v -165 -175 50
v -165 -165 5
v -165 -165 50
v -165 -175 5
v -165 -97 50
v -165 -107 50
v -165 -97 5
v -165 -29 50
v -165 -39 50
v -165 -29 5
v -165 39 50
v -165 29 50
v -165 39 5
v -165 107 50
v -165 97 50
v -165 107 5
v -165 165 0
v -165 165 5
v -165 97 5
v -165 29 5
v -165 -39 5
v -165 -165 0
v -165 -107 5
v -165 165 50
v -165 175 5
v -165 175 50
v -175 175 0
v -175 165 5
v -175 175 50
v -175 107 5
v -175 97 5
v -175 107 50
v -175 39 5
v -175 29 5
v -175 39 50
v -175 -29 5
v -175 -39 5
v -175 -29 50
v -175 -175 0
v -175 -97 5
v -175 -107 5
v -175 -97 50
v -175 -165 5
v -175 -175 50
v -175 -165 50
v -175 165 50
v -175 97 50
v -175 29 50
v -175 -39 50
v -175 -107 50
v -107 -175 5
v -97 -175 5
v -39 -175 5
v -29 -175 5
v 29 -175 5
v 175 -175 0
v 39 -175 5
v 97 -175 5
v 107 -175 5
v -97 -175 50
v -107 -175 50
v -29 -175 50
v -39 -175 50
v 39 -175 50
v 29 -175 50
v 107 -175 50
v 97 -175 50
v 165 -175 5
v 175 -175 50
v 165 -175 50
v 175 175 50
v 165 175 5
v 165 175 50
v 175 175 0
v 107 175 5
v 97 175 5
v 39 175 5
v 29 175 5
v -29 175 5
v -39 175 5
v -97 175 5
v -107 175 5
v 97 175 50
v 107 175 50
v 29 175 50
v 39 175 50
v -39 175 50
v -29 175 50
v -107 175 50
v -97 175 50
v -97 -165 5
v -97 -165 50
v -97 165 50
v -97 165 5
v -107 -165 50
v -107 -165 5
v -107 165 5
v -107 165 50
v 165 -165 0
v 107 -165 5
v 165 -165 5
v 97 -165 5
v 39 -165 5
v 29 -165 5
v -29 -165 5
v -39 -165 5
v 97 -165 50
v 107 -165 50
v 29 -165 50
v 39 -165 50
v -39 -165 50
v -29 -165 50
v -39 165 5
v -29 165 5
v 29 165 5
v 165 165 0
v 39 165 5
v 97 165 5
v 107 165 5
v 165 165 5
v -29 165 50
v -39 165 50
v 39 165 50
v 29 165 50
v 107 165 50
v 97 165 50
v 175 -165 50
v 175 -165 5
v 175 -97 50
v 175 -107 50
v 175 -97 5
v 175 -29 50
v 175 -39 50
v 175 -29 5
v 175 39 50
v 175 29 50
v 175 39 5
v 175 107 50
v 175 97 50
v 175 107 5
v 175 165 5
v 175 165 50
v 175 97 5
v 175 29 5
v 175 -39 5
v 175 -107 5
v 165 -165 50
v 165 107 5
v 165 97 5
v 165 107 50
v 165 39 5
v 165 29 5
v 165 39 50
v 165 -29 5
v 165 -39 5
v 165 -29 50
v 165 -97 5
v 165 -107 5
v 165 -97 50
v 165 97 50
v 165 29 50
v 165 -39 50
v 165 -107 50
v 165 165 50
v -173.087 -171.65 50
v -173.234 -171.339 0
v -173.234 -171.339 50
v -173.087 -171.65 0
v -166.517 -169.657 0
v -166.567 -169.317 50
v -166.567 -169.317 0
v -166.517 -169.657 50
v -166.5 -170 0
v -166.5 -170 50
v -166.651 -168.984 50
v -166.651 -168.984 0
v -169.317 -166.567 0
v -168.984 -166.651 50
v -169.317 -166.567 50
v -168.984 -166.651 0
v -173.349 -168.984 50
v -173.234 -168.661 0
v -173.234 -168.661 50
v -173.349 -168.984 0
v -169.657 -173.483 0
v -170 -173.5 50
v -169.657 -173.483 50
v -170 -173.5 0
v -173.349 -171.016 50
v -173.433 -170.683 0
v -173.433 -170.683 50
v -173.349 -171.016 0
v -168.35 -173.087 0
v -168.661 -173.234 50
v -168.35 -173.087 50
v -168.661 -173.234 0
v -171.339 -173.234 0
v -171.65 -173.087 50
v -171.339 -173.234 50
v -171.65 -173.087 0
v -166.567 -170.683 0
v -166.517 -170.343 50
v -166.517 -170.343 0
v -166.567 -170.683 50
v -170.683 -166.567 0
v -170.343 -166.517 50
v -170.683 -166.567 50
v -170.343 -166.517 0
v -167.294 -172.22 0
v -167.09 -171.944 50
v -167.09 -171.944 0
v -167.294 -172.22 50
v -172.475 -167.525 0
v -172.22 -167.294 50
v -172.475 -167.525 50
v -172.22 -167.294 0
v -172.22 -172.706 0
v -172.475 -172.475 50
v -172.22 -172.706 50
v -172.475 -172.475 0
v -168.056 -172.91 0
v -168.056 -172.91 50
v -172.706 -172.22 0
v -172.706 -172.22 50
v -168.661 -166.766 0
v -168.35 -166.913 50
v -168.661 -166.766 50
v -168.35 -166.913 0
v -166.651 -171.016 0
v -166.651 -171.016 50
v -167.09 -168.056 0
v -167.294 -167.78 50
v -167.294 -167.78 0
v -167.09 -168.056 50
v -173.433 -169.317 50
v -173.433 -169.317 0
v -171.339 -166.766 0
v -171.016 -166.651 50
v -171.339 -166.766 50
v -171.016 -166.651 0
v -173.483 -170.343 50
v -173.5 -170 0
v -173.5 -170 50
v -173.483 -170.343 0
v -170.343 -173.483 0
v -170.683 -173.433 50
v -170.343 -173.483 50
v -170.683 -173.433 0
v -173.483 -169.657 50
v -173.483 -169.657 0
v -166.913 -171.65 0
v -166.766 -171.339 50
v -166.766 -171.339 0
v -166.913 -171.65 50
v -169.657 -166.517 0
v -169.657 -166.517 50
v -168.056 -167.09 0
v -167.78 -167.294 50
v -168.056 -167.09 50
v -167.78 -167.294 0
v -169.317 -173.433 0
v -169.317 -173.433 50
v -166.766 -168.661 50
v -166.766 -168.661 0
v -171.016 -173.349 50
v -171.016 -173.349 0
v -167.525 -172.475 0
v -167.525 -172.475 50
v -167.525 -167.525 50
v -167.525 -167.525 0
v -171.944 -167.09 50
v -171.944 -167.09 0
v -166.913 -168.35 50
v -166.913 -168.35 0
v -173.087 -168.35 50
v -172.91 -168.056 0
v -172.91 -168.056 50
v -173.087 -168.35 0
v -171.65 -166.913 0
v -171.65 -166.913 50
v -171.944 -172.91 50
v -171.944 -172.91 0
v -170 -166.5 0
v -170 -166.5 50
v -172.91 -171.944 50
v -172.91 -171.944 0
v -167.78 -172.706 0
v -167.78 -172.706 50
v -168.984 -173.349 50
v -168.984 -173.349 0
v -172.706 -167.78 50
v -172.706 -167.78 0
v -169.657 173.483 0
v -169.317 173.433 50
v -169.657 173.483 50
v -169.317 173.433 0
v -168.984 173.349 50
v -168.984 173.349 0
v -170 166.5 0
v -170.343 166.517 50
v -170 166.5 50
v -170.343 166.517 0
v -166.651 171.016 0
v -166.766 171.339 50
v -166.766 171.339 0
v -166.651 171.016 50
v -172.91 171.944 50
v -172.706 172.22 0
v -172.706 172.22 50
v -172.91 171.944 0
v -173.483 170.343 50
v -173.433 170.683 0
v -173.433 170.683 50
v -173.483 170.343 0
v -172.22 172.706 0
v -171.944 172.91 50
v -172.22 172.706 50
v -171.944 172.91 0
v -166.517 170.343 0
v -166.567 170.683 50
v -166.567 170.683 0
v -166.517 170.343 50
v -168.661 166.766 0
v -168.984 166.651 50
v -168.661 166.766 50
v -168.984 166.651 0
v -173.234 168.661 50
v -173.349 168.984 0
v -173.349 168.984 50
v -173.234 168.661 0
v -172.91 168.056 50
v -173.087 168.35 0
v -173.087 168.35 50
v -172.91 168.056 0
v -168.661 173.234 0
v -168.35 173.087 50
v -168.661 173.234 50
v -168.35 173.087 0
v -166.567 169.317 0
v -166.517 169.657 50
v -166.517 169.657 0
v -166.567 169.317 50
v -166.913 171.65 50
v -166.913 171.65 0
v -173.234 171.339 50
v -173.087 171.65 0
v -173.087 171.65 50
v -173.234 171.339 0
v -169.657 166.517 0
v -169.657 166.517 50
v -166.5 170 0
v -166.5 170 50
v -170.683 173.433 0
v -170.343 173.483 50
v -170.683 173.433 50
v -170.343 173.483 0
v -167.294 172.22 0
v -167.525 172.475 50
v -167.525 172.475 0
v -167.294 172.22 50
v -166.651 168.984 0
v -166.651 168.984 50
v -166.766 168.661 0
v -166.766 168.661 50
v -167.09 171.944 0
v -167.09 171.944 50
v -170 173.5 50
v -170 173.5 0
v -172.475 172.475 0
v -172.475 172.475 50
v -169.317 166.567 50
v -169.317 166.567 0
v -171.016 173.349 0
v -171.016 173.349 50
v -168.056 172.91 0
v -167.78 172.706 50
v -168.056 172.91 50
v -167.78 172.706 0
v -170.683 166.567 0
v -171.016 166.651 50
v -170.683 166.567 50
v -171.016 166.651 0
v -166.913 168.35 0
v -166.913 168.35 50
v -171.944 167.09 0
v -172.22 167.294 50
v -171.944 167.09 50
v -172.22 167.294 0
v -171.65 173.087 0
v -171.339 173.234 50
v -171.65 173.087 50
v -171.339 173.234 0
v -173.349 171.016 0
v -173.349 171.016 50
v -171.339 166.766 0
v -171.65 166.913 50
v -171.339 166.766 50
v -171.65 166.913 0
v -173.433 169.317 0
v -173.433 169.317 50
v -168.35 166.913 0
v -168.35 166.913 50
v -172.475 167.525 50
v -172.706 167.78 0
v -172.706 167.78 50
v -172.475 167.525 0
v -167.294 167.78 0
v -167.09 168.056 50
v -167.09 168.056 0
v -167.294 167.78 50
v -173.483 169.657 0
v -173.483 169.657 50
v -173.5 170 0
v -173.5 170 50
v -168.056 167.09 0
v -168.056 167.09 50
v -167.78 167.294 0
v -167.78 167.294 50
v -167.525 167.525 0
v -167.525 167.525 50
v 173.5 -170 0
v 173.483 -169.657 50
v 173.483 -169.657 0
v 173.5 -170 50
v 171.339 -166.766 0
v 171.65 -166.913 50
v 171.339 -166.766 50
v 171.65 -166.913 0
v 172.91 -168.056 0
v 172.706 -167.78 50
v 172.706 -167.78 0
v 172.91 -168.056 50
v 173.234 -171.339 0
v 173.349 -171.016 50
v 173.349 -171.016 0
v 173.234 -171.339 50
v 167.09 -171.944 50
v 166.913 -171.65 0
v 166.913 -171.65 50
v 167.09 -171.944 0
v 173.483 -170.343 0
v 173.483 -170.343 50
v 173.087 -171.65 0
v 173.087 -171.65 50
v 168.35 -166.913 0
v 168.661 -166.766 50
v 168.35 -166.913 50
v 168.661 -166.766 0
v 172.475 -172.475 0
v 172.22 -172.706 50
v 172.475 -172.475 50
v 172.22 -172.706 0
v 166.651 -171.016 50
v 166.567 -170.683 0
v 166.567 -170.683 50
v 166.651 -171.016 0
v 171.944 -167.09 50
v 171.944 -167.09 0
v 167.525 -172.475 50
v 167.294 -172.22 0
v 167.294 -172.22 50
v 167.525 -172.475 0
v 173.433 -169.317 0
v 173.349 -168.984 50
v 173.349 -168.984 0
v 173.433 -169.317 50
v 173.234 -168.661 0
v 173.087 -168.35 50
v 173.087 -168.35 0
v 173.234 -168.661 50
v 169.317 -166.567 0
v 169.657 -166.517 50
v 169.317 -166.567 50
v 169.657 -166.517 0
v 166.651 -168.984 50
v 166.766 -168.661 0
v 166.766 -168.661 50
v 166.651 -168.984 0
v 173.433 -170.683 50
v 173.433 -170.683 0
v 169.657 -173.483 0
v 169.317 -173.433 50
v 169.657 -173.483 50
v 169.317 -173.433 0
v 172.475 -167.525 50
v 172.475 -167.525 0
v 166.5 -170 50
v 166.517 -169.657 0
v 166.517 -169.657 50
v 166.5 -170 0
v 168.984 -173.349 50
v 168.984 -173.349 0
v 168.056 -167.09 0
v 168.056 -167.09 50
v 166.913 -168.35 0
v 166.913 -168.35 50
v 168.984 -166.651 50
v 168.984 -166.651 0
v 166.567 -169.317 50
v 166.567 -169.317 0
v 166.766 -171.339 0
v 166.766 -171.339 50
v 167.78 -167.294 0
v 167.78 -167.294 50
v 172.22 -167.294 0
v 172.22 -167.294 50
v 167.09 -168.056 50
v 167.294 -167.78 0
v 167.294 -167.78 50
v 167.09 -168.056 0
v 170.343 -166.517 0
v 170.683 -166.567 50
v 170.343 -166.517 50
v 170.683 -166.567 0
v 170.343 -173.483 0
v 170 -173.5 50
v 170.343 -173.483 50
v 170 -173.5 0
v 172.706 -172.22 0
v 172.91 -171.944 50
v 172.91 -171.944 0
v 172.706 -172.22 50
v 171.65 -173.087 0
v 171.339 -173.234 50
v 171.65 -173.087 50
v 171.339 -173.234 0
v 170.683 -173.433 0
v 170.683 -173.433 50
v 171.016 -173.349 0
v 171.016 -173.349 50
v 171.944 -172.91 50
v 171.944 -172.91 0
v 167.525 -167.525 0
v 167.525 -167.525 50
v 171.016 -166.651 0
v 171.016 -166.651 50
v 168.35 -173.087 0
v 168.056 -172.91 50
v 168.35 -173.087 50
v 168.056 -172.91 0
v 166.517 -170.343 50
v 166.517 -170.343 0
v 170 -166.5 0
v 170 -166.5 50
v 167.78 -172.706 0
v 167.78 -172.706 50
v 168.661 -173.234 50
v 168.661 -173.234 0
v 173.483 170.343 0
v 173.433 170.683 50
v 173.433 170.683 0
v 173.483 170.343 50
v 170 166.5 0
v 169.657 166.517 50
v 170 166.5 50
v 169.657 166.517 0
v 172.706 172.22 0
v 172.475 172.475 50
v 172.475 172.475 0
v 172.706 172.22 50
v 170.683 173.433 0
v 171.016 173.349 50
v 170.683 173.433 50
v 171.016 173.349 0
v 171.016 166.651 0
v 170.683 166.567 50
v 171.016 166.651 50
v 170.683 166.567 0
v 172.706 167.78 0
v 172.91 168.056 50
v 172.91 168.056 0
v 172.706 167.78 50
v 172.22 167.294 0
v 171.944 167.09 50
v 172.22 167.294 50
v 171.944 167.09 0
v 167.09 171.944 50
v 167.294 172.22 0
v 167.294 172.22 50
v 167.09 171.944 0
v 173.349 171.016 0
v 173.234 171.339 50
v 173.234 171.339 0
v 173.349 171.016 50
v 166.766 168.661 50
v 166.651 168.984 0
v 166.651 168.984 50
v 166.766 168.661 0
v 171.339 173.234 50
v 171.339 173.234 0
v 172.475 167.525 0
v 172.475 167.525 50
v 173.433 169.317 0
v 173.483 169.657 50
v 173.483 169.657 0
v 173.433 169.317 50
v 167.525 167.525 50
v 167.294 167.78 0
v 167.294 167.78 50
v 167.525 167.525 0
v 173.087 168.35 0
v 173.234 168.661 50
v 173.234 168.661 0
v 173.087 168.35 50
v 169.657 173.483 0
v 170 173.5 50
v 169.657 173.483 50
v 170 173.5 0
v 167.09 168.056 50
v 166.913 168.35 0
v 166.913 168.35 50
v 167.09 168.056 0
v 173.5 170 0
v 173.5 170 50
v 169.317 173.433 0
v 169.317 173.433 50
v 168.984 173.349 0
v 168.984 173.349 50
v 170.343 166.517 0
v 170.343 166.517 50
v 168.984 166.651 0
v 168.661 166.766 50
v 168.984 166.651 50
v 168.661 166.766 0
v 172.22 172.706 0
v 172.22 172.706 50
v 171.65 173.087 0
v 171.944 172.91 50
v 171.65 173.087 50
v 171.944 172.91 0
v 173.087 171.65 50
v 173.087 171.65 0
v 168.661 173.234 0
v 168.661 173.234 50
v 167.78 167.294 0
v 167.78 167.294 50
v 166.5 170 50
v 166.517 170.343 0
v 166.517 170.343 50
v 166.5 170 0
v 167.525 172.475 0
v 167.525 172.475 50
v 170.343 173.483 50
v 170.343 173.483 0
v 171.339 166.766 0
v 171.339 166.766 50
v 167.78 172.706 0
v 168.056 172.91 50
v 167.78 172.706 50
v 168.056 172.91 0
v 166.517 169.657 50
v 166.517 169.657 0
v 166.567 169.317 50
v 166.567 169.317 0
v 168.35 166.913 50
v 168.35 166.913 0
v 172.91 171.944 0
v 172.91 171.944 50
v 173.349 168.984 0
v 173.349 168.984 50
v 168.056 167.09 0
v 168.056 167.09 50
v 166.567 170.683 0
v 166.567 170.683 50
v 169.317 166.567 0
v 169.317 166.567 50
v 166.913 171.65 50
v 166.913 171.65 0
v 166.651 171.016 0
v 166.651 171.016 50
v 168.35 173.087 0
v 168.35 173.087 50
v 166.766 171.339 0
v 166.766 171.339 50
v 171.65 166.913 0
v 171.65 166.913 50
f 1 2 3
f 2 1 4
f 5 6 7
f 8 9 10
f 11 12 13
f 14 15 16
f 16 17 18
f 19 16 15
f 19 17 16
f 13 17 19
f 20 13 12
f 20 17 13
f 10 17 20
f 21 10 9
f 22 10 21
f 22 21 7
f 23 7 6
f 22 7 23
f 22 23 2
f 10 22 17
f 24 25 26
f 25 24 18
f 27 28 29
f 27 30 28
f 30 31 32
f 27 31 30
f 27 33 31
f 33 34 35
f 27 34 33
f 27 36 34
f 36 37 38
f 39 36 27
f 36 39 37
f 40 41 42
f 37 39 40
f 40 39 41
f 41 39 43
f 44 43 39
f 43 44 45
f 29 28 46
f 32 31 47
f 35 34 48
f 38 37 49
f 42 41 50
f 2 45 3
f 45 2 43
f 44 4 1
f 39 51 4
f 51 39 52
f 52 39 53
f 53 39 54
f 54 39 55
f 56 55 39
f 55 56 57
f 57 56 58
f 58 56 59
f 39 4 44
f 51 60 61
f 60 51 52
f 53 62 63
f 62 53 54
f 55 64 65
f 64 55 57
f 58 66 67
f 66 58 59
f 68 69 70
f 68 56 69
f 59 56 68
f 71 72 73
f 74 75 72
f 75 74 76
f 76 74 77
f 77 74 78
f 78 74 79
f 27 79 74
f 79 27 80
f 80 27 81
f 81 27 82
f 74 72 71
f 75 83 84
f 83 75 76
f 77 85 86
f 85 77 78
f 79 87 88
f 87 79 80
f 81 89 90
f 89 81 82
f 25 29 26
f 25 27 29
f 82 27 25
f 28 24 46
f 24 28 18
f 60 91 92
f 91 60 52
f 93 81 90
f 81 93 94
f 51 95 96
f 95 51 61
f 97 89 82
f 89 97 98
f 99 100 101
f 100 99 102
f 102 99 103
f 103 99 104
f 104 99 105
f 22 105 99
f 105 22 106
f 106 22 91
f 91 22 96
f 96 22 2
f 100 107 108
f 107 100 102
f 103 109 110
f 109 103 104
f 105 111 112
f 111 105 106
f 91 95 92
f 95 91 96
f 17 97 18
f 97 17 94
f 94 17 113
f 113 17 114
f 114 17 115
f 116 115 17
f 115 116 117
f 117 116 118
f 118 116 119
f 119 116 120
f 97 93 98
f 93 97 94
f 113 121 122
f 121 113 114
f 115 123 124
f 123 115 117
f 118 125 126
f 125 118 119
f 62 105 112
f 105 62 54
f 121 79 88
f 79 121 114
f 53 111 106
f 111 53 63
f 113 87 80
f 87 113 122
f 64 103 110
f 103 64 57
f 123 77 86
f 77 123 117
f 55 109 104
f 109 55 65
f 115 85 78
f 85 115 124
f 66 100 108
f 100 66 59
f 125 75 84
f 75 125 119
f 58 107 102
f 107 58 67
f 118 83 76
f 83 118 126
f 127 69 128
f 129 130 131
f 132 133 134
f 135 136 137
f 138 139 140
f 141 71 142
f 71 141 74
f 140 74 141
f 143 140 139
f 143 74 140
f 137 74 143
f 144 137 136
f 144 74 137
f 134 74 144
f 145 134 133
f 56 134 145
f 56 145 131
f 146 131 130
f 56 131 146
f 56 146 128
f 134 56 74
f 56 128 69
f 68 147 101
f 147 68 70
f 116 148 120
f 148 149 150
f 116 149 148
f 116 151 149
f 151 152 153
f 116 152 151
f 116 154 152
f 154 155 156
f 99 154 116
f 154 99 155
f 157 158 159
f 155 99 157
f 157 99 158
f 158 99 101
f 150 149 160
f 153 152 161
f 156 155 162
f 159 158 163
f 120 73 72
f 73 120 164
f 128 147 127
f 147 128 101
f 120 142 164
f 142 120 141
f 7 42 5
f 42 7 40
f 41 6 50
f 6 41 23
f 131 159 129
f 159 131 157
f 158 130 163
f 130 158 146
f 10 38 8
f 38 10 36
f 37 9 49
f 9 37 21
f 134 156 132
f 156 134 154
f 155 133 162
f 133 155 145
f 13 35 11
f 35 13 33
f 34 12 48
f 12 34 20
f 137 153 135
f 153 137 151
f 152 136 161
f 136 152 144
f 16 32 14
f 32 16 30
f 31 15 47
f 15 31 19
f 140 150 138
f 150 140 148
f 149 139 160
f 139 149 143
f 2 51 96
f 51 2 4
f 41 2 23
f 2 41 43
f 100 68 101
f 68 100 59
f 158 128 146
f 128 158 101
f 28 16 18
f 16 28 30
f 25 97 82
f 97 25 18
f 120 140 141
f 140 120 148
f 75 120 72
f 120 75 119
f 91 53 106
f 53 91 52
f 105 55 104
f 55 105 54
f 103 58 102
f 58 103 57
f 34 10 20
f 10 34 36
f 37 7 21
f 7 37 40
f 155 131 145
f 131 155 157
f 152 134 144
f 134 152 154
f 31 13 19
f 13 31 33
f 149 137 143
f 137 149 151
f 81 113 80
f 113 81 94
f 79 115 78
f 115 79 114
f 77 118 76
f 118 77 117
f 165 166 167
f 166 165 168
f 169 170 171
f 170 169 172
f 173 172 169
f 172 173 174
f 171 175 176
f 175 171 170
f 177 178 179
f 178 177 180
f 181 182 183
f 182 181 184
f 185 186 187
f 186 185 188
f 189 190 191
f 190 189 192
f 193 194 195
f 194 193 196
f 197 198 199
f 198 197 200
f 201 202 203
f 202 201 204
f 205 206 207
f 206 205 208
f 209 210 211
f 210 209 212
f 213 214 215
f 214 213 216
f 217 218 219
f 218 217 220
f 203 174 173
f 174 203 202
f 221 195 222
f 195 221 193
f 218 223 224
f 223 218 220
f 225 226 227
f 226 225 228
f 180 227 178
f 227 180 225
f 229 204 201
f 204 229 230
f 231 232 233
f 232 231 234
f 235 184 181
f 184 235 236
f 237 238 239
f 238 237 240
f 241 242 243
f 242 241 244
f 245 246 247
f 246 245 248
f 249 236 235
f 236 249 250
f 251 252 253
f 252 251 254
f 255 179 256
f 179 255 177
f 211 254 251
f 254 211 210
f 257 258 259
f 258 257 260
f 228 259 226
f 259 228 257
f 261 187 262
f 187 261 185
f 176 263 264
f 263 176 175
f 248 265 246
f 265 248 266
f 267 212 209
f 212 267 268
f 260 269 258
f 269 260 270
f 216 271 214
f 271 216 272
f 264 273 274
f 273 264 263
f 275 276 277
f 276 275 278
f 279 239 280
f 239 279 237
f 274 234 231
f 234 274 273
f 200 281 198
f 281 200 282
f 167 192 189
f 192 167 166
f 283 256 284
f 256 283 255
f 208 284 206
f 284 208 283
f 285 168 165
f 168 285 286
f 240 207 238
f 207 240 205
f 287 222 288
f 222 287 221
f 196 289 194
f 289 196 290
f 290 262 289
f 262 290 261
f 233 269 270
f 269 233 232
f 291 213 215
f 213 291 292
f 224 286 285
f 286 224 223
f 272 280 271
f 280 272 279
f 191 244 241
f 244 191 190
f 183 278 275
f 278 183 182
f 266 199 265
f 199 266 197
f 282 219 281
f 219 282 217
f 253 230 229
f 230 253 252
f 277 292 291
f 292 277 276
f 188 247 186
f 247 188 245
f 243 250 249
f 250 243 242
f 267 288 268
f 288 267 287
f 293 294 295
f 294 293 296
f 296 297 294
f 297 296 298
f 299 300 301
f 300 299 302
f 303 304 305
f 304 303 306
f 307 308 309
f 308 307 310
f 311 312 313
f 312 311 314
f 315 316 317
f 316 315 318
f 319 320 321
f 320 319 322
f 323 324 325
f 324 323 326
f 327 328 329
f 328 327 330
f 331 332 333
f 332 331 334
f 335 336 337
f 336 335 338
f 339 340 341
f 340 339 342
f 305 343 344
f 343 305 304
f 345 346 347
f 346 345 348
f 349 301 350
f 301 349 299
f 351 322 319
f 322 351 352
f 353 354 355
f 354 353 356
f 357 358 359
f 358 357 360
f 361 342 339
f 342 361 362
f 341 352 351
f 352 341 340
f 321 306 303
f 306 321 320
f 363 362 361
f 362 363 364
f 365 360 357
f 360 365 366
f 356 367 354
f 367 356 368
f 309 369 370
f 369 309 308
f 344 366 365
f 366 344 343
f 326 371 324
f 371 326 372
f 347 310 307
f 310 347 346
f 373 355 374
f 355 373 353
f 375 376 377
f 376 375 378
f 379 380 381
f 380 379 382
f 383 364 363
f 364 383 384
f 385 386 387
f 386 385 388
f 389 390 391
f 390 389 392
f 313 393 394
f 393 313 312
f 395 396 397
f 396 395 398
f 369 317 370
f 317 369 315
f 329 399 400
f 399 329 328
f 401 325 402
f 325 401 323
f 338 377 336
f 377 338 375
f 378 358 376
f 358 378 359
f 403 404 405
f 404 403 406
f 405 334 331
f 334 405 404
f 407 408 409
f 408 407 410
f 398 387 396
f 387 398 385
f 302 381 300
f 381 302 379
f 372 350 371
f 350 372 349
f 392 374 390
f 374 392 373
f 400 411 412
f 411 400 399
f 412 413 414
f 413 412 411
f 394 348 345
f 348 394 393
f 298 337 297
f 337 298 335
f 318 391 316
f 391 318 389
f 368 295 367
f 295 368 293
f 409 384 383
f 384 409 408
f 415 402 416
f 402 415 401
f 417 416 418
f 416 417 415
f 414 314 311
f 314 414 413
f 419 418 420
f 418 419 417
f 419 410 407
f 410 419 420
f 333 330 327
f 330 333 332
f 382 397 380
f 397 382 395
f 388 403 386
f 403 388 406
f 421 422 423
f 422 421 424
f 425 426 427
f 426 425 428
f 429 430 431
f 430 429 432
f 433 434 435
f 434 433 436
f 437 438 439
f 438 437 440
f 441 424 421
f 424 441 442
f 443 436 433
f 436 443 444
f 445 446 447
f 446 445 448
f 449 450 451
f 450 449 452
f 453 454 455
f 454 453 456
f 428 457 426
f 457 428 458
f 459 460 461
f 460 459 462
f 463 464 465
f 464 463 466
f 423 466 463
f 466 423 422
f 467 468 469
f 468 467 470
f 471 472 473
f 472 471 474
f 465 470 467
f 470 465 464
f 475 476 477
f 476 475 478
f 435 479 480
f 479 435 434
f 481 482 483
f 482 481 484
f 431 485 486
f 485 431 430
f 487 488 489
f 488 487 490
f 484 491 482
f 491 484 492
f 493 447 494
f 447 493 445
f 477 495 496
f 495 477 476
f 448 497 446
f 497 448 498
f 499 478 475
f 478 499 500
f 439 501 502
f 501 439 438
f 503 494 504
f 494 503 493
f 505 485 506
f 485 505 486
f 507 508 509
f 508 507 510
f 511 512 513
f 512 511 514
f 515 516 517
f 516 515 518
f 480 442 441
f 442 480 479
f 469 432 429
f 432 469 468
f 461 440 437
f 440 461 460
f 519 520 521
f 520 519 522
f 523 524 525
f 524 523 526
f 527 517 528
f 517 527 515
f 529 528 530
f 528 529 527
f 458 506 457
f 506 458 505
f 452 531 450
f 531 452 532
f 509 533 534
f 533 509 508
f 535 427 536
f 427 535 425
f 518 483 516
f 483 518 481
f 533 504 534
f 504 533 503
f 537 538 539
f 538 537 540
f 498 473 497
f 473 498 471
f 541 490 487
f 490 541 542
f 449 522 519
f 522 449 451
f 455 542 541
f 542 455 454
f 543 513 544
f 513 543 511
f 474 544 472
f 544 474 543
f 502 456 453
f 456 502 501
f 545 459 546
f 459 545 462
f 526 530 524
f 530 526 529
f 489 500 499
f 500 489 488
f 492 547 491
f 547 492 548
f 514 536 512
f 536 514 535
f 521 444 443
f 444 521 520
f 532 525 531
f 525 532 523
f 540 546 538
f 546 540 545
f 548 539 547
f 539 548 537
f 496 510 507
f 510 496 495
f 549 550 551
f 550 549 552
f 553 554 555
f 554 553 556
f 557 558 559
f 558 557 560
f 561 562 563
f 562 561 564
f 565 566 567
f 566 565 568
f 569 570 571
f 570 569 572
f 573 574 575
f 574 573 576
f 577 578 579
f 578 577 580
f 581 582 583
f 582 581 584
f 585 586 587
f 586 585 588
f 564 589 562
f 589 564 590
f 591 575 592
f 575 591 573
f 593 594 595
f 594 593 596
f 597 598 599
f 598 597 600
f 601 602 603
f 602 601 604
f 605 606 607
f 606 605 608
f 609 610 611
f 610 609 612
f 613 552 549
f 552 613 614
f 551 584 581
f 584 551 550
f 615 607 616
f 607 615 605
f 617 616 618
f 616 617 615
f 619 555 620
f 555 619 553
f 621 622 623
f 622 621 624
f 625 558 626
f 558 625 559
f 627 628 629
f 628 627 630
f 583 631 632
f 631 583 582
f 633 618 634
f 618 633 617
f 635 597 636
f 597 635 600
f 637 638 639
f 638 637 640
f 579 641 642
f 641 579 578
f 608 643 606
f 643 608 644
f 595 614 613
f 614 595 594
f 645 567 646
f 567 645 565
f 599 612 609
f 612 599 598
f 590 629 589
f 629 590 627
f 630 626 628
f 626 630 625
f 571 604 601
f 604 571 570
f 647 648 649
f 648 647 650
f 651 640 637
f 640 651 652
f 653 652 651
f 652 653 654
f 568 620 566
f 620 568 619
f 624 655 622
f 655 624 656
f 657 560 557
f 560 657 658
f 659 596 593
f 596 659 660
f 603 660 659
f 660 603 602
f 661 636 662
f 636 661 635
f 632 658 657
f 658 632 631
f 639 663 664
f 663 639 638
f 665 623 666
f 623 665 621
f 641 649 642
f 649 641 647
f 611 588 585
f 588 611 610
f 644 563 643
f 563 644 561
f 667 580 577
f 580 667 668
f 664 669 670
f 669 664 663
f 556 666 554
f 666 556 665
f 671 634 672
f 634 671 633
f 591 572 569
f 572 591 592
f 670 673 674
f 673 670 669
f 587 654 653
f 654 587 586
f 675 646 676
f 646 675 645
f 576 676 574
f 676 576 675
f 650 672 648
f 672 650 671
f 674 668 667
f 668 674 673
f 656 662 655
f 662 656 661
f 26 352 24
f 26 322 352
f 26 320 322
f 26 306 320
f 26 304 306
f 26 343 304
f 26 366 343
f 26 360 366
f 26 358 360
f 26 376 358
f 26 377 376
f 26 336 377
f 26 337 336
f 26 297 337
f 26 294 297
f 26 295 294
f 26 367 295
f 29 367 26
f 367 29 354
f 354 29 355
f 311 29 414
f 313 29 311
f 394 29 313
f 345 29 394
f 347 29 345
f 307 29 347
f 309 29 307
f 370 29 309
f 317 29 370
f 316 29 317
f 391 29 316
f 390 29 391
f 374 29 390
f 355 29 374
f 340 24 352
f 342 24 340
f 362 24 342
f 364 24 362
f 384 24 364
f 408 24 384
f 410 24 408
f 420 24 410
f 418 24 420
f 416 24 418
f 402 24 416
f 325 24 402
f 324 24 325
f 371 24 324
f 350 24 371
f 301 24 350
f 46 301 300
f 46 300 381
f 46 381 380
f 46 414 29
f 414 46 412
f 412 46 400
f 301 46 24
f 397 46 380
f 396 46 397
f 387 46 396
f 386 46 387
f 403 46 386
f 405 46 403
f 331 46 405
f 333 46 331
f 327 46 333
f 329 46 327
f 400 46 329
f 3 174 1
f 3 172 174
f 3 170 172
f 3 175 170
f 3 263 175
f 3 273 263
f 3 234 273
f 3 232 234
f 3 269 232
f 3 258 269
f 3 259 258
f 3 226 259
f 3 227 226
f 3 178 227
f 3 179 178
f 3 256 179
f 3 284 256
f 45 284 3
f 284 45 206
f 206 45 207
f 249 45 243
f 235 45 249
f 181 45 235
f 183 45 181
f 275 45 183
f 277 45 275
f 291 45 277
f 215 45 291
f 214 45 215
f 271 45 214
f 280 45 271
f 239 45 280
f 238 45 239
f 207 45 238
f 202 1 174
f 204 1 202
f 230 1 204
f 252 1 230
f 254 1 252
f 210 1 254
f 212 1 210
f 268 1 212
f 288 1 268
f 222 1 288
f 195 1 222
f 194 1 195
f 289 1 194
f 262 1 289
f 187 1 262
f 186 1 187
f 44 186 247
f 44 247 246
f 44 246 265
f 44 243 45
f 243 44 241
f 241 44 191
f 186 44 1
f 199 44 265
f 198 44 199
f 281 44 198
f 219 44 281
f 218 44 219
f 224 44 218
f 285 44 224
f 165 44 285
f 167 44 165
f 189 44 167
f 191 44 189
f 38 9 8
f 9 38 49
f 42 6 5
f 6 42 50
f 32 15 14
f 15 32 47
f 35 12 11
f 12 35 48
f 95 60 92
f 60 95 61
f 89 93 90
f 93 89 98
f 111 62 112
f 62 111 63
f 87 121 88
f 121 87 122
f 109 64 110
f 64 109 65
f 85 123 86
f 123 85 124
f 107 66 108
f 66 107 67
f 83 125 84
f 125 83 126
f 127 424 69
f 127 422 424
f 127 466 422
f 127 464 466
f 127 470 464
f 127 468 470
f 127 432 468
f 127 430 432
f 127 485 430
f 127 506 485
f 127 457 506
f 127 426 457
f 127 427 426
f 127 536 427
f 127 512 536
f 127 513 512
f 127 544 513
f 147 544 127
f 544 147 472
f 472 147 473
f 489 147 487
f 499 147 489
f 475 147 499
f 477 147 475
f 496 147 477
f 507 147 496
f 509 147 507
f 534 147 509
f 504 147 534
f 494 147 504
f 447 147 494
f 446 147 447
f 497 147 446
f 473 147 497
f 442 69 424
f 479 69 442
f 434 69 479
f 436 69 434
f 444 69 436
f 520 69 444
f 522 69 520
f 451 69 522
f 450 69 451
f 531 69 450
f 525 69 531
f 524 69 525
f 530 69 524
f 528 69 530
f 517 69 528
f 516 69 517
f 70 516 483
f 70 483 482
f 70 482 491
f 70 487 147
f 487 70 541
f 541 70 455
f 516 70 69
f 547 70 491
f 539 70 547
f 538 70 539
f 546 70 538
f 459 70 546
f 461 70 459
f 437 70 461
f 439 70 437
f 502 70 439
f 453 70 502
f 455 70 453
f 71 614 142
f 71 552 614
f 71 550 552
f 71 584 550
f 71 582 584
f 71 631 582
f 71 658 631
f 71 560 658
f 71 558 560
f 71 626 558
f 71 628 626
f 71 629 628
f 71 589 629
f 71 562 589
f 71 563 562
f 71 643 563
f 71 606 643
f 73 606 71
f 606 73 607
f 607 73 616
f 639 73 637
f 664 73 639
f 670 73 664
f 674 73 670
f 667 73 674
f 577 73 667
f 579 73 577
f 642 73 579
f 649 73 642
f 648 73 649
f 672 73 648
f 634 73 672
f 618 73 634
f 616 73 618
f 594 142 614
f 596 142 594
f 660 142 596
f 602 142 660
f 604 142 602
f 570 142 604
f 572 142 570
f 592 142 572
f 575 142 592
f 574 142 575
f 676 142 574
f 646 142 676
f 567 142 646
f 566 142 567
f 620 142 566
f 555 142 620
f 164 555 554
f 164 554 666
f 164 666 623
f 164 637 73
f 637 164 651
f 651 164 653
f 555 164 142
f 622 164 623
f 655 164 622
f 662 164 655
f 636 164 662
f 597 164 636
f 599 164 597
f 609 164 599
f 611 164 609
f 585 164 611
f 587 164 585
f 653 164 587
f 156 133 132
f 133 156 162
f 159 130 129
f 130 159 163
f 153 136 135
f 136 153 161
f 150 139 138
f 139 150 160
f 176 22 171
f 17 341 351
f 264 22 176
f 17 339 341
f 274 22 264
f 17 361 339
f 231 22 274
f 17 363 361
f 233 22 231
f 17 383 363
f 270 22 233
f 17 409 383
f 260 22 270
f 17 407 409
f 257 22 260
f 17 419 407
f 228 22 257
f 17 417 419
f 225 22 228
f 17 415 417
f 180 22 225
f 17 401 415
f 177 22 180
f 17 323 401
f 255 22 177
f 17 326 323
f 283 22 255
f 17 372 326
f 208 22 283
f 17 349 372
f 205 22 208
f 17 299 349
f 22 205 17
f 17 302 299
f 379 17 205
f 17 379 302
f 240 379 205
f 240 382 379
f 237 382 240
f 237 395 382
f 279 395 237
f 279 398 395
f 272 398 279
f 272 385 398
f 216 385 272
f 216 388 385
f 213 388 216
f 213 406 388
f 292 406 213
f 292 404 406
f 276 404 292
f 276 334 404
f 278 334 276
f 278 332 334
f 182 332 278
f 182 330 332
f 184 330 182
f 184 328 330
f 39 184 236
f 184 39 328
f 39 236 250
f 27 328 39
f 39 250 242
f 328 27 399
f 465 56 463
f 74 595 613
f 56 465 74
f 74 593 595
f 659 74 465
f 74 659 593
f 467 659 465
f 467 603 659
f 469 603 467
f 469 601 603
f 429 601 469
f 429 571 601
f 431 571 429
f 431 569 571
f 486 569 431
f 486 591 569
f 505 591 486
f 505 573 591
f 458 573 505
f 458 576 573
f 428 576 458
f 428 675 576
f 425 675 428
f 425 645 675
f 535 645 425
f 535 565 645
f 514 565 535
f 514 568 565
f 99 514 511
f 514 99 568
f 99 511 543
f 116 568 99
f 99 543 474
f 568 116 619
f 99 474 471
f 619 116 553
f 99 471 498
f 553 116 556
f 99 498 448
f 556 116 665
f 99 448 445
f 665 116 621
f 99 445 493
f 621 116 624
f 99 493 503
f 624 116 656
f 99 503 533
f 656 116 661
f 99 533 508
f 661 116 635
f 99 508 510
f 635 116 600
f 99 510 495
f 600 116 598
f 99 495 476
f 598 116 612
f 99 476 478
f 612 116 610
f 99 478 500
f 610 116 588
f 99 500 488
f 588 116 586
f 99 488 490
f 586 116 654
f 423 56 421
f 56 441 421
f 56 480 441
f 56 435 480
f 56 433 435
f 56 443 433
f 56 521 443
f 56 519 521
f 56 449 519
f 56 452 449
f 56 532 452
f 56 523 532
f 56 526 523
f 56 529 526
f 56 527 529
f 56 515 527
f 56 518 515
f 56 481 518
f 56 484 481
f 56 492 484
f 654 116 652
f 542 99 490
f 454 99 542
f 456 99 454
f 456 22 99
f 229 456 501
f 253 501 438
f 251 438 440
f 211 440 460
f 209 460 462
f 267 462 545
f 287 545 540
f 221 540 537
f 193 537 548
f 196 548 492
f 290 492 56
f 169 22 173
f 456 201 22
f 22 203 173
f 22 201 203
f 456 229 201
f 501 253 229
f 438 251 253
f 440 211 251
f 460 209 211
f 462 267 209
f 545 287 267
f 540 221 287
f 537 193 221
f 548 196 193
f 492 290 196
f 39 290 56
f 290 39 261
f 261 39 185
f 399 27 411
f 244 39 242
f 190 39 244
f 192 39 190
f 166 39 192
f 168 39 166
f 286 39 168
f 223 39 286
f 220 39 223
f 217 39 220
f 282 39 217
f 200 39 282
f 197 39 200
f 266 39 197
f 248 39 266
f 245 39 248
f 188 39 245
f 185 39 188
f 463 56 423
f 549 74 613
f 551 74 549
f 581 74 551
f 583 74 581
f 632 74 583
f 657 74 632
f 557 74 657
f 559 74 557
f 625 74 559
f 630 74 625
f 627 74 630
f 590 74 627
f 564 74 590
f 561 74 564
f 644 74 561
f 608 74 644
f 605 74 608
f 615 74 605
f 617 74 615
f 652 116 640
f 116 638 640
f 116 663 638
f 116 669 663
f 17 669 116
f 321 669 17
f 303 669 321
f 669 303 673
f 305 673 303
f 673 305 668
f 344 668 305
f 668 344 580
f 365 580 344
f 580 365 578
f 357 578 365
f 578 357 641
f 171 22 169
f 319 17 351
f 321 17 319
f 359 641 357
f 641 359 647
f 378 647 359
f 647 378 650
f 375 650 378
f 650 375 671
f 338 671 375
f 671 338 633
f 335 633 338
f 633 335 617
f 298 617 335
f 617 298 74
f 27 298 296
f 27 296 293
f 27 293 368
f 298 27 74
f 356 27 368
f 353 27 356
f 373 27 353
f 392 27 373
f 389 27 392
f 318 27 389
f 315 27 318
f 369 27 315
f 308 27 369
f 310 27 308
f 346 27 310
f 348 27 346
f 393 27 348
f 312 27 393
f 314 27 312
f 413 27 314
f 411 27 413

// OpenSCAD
// Cage slice - index 7
bar = 10;
outer = 350;
half = outer / 2;
height = 700;

N_xy = 6;
N_z  = 11;

x_spacing = (outer - bar) / (N_xy - 1);
z_spacing = (height - bar) / (N_z  - 1);

xs = [ for (i = [0 : N_xy - 1]) (-half + bar/2 + i * x_spacing) ];
ys = xs;

zs = [ for (k = [0 : N_z - 1]) (bar/2 + k * z_spacing) ];

$fn = 64;

module cage_bars() {
    union() {
        // Vertical bars on front and back faces
        for (xv = xs) {
            translate([xv, -half + bar/2, height/2])
                cube([bar, bar, height], center = true);
            translate([xv,  half - bar/2, height/2])
                cube([bar, bar, height], center = true);
        }

        // Vertical bars on left and right faces
        for (yv = ys) {
            translate([-half + bar/2, yv, height/2])
                cube([bar, bar, height], center = true);
            translate([ half - bar/2, yv, height/2])
                cube([bar, bar, height], center = true);
        }

        // Horizontal x-bars on front and back faces
        for (zv = zs) {
            translate([0, -half + bar/2, zv])
                cube([outer, bar, bar], center = true);
            translate([0,  half - bar/2, zv])
                cube([outer, bar, bar], center = true);
        }

        // Horizontal y-bars on left and right faces
        for (zv = zs) {
            translate([-half + bar/2, 0, zv])
                cube([bar, outer, bar], center = true);
            translate([ half - bar/2, 0, zv])
                cube([bar, outer, bar], center = true);
        }

        // Floor and ceiling extra x-bars at all y positions
        z_floor = bar/2;
        z_ceil  = height - bar/2;
        for (yv = ys) {
            translate([0, yv, z_floor])
                cube([outer, bar, bar], center = true);
            translate([0, yv, z_ceil])
                cube([outer, bar, bar], center = true);
        }

        // Floor and ceiling extra y-bars at all x positions
        for (xv = xs) {
            translate([xv, 0, z_floor])
                cube([bar, outer, bar], center = true);
            translate([xv, 0, z_ceil])
                cube([bar, outer, bar], center = true);
        }
    }
}

module corner_holes() {
    hole_d = 7;
    for (sx = [-1, 1])
        for (sy = [-1, 1])
            translate([sx * (half - bar/2), sy * (half - bar/2), height/2])
                cylinder(h = height + 2, d = hole_d, center = true);
}

module cage_full() {
    difference() {
        cage_bars();
        corner_holes();
    }
}

slice_index = 7;
slice_height = 50;

module cage_slice() {
    translate([0, 0, -slice_index * slice_height]) {
        intersection() {
            cage_full();
            translate([0, 0, slice_index * slice_height + slice_height/2])
                cube([outer + 20, outer + 20, slice_height], center = true);
        }
    }
}

cage_slice();
